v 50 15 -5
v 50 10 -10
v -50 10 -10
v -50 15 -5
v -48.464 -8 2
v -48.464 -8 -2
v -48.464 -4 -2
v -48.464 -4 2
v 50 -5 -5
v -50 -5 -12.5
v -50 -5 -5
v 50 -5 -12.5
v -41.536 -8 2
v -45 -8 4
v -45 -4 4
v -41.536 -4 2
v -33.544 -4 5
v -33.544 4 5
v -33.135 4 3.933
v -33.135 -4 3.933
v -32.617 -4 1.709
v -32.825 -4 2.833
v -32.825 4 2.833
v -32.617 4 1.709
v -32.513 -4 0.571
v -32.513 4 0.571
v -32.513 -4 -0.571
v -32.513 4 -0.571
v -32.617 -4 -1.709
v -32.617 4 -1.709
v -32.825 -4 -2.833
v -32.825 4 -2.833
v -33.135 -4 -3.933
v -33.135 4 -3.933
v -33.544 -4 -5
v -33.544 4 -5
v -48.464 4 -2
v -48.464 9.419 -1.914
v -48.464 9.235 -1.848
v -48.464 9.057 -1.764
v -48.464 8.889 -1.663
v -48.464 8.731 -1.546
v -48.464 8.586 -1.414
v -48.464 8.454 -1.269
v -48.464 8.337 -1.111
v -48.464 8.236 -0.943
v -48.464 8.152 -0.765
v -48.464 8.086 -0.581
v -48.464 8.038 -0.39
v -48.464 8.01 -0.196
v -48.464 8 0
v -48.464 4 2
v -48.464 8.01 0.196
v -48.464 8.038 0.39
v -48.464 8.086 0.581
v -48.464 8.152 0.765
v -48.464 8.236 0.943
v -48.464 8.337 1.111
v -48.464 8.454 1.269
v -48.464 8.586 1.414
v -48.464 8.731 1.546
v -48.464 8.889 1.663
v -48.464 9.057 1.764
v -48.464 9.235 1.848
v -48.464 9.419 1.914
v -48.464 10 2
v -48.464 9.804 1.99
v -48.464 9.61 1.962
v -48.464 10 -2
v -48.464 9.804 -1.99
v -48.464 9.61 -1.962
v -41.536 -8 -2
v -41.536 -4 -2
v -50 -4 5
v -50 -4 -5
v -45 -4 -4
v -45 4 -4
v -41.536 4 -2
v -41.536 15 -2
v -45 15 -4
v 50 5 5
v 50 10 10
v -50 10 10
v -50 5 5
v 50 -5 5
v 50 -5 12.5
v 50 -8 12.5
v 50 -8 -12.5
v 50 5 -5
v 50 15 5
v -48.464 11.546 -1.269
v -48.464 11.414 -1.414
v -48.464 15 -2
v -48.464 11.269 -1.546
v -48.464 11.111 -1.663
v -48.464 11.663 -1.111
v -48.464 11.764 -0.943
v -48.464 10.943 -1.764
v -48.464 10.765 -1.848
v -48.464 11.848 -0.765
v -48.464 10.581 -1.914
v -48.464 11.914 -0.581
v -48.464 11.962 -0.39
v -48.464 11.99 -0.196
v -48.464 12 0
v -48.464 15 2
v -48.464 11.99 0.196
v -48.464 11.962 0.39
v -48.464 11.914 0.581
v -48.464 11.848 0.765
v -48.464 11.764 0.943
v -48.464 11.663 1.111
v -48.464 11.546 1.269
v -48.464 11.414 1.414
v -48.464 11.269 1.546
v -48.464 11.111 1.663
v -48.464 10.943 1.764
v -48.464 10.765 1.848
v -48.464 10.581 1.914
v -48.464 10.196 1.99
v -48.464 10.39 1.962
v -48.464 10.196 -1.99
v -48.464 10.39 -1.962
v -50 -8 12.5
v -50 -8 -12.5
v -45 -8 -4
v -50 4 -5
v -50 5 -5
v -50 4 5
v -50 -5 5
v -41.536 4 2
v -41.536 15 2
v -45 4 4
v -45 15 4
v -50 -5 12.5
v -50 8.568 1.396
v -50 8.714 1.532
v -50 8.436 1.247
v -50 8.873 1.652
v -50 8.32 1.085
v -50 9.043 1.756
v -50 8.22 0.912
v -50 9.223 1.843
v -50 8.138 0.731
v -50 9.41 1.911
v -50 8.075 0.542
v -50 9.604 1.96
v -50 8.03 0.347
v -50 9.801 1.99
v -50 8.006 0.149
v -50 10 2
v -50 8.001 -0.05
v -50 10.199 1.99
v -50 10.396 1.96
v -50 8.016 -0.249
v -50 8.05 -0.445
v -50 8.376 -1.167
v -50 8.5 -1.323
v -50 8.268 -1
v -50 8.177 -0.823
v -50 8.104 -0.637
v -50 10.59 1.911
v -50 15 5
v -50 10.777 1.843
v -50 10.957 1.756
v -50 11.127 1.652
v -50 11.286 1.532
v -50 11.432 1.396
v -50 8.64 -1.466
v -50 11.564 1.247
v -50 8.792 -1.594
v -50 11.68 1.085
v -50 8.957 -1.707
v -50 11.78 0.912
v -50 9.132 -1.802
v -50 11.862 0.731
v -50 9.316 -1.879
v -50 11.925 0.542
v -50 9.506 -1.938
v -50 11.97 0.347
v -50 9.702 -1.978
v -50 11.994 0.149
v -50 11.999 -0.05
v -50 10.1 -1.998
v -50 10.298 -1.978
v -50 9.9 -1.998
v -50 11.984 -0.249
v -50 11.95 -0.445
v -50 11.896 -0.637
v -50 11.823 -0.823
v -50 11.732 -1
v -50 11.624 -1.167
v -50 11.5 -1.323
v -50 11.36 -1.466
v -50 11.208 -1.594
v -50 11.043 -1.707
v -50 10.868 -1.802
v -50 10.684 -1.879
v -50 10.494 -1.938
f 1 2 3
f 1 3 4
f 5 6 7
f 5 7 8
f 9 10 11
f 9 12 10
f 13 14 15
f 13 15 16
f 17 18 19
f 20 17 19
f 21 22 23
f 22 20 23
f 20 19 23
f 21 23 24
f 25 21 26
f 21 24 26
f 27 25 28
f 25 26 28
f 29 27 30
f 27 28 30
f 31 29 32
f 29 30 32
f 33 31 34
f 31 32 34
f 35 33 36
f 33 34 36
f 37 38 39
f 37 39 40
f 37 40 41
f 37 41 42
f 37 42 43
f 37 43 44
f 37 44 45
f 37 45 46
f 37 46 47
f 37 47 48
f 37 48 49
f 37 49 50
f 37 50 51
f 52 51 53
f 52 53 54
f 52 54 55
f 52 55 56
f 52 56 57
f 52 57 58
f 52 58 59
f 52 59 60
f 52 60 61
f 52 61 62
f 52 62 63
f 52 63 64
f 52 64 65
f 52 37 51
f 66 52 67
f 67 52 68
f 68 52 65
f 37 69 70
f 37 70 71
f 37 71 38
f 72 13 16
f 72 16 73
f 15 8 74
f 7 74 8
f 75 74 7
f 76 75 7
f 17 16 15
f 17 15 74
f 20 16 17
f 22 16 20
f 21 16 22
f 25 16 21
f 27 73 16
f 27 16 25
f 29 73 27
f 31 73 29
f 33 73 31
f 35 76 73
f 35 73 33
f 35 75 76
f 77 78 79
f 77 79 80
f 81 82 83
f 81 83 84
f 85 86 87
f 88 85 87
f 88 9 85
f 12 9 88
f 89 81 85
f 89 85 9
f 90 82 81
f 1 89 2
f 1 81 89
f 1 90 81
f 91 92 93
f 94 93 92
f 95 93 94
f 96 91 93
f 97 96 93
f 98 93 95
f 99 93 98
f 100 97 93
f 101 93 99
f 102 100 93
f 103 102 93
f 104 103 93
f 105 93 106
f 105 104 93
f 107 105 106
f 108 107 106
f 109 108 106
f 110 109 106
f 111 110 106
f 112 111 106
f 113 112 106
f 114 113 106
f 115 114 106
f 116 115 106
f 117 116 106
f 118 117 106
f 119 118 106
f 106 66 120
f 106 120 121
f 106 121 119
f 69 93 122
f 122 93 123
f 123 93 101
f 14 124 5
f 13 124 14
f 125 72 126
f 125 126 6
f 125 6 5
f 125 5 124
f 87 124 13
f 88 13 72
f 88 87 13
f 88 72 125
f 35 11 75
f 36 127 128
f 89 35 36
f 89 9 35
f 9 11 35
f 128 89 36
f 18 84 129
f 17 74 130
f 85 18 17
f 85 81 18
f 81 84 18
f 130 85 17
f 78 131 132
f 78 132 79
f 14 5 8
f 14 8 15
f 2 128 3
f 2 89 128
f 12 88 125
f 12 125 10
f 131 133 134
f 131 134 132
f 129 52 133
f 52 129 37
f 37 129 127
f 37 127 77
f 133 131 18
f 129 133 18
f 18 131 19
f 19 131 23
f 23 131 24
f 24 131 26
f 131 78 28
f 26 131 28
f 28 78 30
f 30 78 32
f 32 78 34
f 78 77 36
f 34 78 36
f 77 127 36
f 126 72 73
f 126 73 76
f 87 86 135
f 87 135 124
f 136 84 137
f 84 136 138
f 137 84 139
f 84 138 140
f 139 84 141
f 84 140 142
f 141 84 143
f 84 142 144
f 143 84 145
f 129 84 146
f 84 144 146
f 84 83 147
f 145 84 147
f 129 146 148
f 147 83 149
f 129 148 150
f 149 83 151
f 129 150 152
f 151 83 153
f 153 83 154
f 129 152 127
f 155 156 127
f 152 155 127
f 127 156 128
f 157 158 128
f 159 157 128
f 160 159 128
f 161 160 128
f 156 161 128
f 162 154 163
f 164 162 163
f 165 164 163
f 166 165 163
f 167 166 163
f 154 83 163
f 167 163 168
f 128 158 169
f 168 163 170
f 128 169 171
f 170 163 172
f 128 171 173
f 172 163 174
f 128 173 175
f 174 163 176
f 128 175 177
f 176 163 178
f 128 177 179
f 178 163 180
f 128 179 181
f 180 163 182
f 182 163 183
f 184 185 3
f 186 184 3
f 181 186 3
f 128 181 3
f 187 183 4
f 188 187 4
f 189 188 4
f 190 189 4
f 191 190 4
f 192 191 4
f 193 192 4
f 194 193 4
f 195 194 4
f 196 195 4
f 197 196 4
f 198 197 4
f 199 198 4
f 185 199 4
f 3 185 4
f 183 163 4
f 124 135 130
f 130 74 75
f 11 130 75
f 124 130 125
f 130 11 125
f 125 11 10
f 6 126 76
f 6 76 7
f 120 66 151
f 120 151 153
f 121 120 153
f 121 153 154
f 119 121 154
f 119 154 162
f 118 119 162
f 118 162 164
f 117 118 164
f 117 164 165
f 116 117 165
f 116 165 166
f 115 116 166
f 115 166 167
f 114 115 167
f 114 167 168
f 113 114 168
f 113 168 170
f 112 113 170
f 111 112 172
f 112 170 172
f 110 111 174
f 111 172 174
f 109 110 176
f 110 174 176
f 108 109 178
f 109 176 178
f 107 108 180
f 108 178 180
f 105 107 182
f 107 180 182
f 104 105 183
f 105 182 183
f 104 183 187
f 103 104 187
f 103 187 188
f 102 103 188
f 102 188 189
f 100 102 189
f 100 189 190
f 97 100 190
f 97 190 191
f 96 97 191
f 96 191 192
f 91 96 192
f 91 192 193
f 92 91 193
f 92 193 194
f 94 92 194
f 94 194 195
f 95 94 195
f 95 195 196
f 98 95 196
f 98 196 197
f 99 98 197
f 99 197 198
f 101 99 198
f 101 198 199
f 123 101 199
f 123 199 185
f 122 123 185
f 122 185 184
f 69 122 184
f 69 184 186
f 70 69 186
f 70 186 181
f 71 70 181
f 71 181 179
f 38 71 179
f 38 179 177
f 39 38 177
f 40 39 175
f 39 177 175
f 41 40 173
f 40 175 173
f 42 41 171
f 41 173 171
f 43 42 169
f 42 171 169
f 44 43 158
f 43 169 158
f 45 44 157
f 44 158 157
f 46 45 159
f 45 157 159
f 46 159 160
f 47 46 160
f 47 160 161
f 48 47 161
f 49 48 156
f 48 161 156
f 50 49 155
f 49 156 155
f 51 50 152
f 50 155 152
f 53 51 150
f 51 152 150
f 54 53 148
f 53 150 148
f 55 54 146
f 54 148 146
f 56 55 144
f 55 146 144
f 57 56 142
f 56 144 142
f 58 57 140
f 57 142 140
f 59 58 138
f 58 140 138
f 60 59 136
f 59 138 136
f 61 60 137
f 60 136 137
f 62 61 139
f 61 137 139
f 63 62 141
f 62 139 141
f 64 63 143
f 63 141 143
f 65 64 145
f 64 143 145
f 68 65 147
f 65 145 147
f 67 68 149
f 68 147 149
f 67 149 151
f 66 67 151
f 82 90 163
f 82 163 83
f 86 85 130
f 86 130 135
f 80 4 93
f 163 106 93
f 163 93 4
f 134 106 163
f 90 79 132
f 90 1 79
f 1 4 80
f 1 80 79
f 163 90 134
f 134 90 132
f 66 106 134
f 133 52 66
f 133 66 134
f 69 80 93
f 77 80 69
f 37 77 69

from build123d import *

# Parameters (mm, degrees)
BOSS_EXTRUDE1_DEPTH     = 50
SKETCH2_R               = 12.5
CUT_EXTRUDE1_DEPTH      = 4
CUT_EXTRUDE3_DEPTH      = 54.677276384
CUT_EXTRUDE3_DEPTH_BACK = 54.677276384
SKETCH6_R               = 2
CUT_EXTRUDE4_DEPTH      = 4


with BuildPart() as part:
    # Sketch1 → Boss-Extrude1 (new, symmetric)
    with BuildSketch(Plane(origin=(0, 0, 0), x_dir=(0, 0, -1), z_dir=(1, 0, 0))):
        Polygon((5, 5), (10, 10), (5, 15), (-5, 15), (-10, 10), (-5, 5), (-5, -5), (-12.5, -5), (-12.5, -8), (12.5, -8), (12.5, -5), (5, -5), align=None)
    extrude(amount=BOSS_EXTRUDE1_DEPTH, both=True)

    # Sketch2 → Cut-Extrude1 (cut, symmetric)
    with BuildSketch(Plane(origin=(0, 0, 0), x_dir=(1, 0, 0), z_dir=(0, 1, 0))):
        with Locations((-45, 0)):
            Circle(SKETCH2_R)
    extrude(amount=CUT_EXTRUDE1_DEPTH, both=True, mode=Mode.SUBTRACT)

    # Sketch4 → Cut-Extrude3 (cut, two sides: drawn at the far end of the back side and taken through both)
    with BuildSketch(Plane(origin=(0, 0, 0), x_dir=(1, 0, 0), z_dir=(0, 1, 0)).offset(-CUT_EXTRUDE3_DEPTH_BACK)):
        Polygon((-45, -4), (-41.535898385, -2), (-41.535898385, 2), (-45, 4), (-48.464101615, 2), (-48.464101615, -2), align=None)
    extrude(amount=CUT_EXTRUDE3_DEPTH + CUT_EXTRUDE3_DEPTH_BACK, mode=Mode.SUBTRACT)

    # Sketch6 → Cut-Extrude4 (cut)
    with BuildSketch(Plane.ZY.offset(50)):
        with Locations((0, 10)):
            Circle(SKETCH6_R)
    extrude(amount=-CUT_EXTRUDE4_DEPTH, mode=Mode.SUBTRACT)


solid = part.part
